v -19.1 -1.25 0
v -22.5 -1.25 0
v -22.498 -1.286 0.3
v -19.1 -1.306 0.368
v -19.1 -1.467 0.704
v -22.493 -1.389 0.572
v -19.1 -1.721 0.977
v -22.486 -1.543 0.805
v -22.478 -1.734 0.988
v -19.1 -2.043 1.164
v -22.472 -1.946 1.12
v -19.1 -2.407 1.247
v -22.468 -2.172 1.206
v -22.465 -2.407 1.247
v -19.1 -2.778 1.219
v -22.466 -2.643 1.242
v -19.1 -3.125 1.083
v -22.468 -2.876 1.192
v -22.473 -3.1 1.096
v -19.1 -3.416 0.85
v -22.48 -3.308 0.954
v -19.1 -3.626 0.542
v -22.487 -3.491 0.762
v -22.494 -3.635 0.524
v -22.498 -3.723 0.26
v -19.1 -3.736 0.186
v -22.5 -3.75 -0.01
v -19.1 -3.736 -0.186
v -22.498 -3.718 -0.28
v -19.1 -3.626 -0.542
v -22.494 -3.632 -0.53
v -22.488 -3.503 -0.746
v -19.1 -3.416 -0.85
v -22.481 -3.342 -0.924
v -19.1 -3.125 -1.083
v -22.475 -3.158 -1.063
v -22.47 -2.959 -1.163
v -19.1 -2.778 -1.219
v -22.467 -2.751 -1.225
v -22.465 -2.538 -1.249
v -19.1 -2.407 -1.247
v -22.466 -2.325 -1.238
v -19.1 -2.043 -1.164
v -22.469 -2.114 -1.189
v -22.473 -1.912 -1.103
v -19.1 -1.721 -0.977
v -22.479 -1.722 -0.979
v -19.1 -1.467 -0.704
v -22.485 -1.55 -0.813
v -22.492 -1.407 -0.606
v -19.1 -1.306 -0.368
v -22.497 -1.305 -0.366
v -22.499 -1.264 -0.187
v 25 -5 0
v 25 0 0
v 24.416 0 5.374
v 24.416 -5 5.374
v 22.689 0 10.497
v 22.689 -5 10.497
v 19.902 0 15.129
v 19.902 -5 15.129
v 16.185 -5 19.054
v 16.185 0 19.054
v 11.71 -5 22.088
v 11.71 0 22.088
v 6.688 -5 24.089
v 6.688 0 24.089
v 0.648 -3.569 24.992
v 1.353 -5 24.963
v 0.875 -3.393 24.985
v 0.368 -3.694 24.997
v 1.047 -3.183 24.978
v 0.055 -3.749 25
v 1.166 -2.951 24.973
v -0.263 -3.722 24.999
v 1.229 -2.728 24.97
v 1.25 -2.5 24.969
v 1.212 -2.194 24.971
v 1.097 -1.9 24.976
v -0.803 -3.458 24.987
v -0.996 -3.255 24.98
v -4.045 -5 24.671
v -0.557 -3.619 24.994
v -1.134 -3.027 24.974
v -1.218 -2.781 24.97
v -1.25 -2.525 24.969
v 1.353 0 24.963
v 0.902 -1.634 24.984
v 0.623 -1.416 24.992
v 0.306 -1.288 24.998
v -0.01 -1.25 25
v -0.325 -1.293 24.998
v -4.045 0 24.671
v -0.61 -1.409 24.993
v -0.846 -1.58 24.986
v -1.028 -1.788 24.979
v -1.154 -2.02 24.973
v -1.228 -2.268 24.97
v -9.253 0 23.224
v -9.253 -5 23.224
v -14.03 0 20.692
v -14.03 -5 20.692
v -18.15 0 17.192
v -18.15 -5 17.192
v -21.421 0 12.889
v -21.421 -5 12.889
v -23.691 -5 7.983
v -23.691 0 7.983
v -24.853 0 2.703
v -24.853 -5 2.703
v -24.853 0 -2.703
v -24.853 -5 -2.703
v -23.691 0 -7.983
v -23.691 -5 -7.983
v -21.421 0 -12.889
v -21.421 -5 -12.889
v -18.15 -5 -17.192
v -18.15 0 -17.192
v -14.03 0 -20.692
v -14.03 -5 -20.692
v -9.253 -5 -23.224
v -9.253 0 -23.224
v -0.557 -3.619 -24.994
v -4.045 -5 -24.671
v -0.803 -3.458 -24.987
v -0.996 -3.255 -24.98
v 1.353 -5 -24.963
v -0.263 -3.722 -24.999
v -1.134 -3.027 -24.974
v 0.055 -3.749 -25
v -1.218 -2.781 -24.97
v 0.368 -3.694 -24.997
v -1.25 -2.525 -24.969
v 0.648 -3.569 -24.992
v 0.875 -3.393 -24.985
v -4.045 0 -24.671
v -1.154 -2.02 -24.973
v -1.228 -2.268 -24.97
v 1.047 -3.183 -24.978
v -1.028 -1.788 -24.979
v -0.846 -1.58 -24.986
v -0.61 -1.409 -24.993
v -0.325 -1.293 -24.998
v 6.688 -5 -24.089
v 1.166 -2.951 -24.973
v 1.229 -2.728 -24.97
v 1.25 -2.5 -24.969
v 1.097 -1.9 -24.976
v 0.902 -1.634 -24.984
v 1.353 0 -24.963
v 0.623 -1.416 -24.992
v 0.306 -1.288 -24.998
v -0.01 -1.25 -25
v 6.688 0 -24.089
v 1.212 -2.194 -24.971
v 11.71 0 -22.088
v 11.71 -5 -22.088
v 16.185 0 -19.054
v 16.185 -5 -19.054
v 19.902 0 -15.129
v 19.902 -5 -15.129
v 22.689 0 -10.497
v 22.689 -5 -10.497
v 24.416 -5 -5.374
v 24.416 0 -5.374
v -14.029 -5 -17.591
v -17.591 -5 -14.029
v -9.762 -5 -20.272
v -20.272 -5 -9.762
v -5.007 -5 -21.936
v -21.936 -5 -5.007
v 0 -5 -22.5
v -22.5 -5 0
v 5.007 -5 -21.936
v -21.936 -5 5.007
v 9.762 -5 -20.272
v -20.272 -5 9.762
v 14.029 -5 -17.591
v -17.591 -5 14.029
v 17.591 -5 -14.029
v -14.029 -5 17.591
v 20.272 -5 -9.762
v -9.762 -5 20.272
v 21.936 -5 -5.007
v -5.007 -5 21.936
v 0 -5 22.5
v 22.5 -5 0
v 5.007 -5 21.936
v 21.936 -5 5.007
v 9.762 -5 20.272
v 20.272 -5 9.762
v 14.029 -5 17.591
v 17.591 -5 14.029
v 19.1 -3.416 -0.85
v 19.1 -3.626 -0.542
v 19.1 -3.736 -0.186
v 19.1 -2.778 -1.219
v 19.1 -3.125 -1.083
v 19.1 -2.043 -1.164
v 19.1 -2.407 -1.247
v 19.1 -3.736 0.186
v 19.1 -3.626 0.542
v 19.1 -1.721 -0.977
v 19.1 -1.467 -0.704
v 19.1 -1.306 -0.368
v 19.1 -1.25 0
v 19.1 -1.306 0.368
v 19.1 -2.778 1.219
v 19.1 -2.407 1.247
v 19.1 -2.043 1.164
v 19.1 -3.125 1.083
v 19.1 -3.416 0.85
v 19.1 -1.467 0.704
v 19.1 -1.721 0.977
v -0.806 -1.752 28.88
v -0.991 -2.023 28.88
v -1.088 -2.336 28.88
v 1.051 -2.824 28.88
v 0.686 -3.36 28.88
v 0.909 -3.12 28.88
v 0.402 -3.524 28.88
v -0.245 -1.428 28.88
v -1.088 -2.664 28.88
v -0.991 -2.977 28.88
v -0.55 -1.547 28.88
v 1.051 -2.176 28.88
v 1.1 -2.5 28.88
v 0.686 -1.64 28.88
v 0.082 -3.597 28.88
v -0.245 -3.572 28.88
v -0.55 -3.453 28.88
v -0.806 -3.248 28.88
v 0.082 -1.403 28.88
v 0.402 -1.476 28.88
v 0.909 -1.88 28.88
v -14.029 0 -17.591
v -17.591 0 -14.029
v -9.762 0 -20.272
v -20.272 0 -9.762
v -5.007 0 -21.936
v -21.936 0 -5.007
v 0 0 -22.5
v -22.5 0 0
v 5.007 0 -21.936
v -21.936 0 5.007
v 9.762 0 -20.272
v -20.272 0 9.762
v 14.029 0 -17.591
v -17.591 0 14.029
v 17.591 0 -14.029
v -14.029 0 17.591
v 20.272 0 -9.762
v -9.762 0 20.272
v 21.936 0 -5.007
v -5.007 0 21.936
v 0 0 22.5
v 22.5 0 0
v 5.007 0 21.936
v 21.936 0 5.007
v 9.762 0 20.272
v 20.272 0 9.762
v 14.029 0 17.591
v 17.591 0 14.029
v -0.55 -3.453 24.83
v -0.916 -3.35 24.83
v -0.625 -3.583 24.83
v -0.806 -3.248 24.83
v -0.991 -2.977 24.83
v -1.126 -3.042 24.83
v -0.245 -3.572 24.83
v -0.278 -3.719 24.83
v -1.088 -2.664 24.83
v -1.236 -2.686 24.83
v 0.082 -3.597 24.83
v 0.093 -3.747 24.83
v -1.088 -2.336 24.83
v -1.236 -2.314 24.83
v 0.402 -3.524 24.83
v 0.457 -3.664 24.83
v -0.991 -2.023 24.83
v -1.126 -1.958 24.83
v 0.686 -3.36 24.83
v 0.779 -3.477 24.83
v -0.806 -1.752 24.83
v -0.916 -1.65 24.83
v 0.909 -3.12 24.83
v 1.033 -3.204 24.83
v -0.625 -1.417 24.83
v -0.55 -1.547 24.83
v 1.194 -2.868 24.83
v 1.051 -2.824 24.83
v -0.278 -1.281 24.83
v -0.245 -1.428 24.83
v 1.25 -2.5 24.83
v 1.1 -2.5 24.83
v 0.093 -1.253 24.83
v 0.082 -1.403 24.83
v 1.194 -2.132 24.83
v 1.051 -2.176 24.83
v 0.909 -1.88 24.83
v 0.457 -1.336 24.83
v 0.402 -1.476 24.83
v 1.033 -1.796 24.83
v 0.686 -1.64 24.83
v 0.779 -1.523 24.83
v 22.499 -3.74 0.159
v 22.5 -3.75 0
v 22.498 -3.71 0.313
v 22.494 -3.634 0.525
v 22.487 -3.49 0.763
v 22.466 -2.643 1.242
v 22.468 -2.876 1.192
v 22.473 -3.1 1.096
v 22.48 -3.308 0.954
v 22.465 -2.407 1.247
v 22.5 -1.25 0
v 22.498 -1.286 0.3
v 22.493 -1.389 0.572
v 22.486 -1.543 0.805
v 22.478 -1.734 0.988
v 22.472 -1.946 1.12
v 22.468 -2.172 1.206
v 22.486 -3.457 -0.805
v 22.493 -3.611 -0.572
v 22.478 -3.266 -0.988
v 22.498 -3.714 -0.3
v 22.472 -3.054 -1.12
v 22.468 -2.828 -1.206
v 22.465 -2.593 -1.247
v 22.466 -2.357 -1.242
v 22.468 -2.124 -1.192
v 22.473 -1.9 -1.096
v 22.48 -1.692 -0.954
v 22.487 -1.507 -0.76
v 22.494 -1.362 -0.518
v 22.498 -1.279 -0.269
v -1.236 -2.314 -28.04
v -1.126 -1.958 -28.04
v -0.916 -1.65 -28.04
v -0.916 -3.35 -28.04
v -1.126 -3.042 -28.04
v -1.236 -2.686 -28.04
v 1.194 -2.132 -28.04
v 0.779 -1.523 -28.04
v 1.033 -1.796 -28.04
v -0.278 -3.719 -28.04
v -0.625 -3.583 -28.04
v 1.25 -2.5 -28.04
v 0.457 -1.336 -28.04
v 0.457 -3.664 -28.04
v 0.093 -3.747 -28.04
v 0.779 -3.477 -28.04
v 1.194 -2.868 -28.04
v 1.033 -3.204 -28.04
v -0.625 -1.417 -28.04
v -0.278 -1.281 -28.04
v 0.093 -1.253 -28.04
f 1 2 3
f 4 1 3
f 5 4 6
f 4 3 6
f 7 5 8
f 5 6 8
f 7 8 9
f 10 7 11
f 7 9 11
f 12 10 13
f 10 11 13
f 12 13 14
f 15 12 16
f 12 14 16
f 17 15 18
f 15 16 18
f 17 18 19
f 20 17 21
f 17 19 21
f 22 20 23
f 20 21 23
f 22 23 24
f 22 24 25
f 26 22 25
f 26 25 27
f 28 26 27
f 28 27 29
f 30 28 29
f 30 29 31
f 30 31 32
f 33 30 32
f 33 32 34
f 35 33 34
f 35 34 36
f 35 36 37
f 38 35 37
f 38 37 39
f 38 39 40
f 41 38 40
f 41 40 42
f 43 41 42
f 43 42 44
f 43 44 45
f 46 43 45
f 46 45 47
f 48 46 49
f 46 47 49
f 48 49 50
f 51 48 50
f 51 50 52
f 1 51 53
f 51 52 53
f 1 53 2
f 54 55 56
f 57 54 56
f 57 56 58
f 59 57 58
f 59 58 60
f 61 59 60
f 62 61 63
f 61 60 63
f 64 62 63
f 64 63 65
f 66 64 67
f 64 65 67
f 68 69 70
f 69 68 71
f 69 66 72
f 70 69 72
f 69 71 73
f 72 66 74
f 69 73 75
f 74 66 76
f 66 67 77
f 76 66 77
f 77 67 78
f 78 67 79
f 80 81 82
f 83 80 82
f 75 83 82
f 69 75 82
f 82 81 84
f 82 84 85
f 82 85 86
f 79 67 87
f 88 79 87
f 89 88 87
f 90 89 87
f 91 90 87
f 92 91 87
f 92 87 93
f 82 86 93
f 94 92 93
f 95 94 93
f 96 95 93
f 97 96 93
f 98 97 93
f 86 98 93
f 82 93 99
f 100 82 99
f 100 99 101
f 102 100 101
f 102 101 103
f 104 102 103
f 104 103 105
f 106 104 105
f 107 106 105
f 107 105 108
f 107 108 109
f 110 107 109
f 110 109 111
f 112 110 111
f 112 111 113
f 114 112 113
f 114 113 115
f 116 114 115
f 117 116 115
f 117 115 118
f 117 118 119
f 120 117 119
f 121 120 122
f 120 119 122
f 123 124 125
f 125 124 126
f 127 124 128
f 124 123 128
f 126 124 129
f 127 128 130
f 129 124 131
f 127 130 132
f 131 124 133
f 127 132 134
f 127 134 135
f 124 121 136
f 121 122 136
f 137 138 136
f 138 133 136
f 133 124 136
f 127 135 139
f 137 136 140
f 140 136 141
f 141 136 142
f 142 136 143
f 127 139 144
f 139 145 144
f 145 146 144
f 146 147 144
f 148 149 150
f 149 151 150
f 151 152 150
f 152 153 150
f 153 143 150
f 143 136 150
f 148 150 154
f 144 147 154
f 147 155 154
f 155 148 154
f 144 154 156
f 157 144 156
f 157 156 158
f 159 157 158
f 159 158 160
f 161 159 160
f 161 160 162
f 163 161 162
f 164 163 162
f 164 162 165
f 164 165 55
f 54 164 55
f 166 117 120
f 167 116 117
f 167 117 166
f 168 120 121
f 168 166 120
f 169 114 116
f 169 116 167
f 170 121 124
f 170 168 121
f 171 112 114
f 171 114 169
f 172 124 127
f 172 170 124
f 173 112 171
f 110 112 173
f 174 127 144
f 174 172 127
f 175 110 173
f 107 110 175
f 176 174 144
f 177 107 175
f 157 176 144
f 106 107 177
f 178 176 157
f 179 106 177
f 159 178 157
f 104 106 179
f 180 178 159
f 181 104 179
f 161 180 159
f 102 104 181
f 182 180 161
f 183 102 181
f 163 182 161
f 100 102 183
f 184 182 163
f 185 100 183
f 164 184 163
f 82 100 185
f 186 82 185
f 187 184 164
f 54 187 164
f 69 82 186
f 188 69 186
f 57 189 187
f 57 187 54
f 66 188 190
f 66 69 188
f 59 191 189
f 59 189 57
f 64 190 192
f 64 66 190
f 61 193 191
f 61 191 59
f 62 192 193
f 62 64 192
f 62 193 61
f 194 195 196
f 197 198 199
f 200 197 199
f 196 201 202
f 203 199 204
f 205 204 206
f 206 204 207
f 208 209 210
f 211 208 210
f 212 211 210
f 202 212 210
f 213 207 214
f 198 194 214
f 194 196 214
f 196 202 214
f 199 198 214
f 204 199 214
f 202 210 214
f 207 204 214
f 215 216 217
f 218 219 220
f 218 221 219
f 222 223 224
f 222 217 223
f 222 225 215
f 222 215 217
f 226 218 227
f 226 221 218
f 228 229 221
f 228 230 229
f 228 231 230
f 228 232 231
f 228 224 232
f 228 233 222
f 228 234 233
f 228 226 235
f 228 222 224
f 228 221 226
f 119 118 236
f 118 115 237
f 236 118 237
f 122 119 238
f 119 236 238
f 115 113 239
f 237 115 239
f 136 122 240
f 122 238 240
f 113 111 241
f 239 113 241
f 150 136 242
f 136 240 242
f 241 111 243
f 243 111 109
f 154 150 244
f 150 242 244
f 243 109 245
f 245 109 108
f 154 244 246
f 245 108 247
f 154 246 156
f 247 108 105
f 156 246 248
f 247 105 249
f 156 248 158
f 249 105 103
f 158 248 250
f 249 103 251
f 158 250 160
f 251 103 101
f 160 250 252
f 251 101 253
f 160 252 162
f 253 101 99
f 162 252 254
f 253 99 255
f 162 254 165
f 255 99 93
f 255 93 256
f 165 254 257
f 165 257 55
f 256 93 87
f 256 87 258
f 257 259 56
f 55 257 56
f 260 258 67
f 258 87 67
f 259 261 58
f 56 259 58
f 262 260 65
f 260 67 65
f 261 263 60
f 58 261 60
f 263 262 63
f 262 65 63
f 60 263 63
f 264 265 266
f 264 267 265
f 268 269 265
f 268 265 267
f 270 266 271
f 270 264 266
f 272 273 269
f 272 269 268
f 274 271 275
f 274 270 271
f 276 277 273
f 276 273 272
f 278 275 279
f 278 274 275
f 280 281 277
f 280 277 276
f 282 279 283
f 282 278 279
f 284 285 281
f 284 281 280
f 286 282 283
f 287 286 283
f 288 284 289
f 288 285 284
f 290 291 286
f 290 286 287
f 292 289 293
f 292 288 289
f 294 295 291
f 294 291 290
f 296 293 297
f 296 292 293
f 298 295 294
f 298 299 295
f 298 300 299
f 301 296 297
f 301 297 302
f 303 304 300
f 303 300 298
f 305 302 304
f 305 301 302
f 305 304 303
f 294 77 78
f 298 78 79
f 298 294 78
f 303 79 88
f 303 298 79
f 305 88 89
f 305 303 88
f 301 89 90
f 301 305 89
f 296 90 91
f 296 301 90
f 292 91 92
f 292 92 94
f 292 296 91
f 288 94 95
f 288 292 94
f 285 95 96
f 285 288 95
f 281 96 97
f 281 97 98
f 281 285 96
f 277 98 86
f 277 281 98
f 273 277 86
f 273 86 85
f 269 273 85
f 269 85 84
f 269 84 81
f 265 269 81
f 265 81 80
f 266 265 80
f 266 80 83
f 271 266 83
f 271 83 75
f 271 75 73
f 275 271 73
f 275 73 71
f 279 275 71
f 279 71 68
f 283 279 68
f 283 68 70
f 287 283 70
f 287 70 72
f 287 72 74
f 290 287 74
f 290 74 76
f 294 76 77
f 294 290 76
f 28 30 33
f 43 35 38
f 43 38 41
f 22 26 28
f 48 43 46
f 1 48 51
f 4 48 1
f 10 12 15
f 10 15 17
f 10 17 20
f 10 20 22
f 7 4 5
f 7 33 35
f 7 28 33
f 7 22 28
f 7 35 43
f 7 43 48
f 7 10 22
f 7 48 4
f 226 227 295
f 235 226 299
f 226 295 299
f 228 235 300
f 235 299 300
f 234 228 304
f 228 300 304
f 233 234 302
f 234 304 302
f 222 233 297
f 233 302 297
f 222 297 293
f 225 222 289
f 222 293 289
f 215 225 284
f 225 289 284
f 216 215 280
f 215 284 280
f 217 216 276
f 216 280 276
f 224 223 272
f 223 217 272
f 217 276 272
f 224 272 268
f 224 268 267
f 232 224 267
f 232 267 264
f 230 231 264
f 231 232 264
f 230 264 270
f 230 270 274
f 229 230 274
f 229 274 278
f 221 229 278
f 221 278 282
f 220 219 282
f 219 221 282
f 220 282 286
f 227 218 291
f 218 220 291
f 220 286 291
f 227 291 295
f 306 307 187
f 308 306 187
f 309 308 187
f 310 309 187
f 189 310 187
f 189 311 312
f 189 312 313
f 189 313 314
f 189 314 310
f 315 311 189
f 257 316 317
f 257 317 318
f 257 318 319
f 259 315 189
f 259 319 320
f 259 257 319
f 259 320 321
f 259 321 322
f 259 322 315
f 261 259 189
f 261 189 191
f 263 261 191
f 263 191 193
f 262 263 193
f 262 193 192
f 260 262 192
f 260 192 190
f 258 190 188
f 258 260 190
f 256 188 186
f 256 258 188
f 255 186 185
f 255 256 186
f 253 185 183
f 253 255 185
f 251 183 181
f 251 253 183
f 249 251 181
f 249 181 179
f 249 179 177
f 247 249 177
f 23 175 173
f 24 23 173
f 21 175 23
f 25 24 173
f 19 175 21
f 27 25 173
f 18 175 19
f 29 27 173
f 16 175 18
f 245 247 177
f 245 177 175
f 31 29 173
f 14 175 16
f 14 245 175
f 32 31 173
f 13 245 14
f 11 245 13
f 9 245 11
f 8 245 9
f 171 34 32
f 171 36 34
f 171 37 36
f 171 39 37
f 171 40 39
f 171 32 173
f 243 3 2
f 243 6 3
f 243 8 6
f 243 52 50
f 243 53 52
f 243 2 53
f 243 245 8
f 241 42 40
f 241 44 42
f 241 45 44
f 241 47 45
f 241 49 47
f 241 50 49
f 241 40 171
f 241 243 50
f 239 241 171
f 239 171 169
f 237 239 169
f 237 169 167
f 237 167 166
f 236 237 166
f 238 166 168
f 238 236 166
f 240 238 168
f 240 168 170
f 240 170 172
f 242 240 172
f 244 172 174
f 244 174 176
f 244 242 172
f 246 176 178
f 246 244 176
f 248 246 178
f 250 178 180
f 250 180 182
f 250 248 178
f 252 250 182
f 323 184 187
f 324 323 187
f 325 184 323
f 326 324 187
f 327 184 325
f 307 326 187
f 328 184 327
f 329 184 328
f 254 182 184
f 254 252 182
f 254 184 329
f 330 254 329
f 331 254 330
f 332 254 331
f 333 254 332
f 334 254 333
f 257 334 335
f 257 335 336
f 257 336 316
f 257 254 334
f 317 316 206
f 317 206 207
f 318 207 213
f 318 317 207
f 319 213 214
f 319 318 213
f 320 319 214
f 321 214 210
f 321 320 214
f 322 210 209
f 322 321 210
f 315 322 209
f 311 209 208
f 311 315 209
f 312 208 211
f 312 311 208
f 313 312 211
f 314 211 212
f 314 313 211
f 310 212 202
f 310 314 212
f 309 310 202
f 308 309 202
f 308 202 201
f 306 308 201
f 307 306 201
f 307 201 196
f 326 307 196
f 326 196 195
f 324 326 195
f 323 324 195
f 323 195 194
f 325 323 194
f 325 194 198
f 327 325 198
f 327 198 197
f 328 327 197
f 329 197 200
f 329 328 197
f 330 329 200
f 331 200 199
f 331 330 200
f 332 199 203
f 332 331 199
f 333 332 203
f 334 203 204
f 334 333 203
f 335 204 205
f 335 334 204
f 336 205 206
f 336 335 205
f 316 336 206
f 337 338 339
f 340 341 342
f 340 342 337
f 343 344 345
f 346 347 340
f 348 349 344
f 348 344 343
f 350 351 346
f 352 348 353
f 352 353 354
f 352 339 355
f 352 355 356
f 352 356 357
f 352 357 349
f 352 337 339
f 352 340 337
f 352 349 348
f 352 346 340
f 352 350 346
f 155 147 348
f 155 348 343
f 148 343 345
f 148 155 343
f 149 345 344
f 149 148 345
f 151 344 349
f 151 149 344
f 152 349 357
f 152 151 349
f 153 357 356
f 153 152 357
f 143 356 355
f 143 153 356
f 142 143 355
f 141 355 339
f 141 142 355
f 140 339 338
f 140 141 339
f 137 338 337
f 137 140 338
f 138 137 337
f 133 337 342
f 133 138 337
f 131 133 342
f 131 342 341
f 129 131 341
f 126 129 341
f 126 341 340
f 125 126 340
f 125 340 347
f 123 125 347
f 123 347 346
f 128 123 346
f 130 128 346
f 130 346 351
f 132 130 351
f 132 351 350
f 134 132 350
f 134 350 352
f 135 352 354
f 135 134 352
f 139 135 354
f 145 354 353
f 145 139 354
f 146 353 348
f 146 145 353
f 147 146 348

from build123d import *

# Parameters (mm, degrees)
F0_R      = 25
F0_R_2    = 22.5
F1_DEPTH  = 5
F3_R      = 1.25
F4_DEPTH  = 3.8
F6_R      = 1.25
F7_DEPTH  = 3.4
F8_R      = 1.25
F9_DEPTH  = 0.25
F10_R     = 1.25
F11_DEPTH = 0.25
F13_R     = 1.25
F13_R_2   = 1.1
F14_DEPTH = 25
F16_R     = 1.25
F17_DEPTH = 4.4


# Not quite as in the source:
# - a pattern or mirror of a feature is missing from the dataset's text; its kind, count and spacing are read off the source's solid


with BuildPart() as f1:
    # F0 (on Front) → F1 (new body)
    with BuildSketch(Plane.XZ):
        Circle(F0_R)
        Circle(F0_R_2, mode=Mode.SUBTRACT)
    extrude(amount=F1_DEPTH)

    # F3 (on offset) → F4 (join)
    with BuildSketch(Plane.XY.offset(24.83)):
        with Locations((0, -2.5)):
            Circle(F3_R)
    extrude(amount=F4_DEPTH)

    # F6 (on offset) → F7 (join)
    with BuildSketch(Plane.XY.offset(-24.39)):
        with Locations((0, -2.5)):
            Circle(F6_R)
    extrude(amount=-F7_DEPTH)

    # F8 (on face) → F9 (join)
    with BuildSketch(Plane(origin=(0, 0, -27.79), x_dir=(1, 0, 0), z_dir=(0, 0, -1))):
        with Locations((0, 2.5)):
            Circle(F8_R)
    extrude(amount=F9_DEPTH)

    # F10 (on face) → F11 (join)
    with BuildSketch(Plane.XY.offset(28.63)):
        with Locations((0, -2.5)):
            Circle(F10_R)
    extrude(amount=F11_DEPTH)

    # F13 (on offset) → F14 (cut)
    with BuildSketch(Plane.XY.offset(24.83)):
        with Locations((0, -2.5)):
            Circle(F13_R)
        with Locations((0, -2.5)):
            Circle(F13_R_2, mode=Mode.SUBTRACT)
    extrude(amount=F14_DEPTH, mode=Mode.SUBTRACT)

    # F16 (on offset) → F17 (join)
    with BuildSketch(Plane.YZ.offset(23.5)):
        with Locations((-2.5, 0)):
            Circle(F16_R)
    f17 = extrude(amount=-F17_DEPTH)

    # F17_copies: F17 across plane
    add(f17.mirror(Plane(origin=(0, 0, 0), x_dir=(0, 0, -1), z_dir=(-1, 0, 0))))


solid = f1.part
